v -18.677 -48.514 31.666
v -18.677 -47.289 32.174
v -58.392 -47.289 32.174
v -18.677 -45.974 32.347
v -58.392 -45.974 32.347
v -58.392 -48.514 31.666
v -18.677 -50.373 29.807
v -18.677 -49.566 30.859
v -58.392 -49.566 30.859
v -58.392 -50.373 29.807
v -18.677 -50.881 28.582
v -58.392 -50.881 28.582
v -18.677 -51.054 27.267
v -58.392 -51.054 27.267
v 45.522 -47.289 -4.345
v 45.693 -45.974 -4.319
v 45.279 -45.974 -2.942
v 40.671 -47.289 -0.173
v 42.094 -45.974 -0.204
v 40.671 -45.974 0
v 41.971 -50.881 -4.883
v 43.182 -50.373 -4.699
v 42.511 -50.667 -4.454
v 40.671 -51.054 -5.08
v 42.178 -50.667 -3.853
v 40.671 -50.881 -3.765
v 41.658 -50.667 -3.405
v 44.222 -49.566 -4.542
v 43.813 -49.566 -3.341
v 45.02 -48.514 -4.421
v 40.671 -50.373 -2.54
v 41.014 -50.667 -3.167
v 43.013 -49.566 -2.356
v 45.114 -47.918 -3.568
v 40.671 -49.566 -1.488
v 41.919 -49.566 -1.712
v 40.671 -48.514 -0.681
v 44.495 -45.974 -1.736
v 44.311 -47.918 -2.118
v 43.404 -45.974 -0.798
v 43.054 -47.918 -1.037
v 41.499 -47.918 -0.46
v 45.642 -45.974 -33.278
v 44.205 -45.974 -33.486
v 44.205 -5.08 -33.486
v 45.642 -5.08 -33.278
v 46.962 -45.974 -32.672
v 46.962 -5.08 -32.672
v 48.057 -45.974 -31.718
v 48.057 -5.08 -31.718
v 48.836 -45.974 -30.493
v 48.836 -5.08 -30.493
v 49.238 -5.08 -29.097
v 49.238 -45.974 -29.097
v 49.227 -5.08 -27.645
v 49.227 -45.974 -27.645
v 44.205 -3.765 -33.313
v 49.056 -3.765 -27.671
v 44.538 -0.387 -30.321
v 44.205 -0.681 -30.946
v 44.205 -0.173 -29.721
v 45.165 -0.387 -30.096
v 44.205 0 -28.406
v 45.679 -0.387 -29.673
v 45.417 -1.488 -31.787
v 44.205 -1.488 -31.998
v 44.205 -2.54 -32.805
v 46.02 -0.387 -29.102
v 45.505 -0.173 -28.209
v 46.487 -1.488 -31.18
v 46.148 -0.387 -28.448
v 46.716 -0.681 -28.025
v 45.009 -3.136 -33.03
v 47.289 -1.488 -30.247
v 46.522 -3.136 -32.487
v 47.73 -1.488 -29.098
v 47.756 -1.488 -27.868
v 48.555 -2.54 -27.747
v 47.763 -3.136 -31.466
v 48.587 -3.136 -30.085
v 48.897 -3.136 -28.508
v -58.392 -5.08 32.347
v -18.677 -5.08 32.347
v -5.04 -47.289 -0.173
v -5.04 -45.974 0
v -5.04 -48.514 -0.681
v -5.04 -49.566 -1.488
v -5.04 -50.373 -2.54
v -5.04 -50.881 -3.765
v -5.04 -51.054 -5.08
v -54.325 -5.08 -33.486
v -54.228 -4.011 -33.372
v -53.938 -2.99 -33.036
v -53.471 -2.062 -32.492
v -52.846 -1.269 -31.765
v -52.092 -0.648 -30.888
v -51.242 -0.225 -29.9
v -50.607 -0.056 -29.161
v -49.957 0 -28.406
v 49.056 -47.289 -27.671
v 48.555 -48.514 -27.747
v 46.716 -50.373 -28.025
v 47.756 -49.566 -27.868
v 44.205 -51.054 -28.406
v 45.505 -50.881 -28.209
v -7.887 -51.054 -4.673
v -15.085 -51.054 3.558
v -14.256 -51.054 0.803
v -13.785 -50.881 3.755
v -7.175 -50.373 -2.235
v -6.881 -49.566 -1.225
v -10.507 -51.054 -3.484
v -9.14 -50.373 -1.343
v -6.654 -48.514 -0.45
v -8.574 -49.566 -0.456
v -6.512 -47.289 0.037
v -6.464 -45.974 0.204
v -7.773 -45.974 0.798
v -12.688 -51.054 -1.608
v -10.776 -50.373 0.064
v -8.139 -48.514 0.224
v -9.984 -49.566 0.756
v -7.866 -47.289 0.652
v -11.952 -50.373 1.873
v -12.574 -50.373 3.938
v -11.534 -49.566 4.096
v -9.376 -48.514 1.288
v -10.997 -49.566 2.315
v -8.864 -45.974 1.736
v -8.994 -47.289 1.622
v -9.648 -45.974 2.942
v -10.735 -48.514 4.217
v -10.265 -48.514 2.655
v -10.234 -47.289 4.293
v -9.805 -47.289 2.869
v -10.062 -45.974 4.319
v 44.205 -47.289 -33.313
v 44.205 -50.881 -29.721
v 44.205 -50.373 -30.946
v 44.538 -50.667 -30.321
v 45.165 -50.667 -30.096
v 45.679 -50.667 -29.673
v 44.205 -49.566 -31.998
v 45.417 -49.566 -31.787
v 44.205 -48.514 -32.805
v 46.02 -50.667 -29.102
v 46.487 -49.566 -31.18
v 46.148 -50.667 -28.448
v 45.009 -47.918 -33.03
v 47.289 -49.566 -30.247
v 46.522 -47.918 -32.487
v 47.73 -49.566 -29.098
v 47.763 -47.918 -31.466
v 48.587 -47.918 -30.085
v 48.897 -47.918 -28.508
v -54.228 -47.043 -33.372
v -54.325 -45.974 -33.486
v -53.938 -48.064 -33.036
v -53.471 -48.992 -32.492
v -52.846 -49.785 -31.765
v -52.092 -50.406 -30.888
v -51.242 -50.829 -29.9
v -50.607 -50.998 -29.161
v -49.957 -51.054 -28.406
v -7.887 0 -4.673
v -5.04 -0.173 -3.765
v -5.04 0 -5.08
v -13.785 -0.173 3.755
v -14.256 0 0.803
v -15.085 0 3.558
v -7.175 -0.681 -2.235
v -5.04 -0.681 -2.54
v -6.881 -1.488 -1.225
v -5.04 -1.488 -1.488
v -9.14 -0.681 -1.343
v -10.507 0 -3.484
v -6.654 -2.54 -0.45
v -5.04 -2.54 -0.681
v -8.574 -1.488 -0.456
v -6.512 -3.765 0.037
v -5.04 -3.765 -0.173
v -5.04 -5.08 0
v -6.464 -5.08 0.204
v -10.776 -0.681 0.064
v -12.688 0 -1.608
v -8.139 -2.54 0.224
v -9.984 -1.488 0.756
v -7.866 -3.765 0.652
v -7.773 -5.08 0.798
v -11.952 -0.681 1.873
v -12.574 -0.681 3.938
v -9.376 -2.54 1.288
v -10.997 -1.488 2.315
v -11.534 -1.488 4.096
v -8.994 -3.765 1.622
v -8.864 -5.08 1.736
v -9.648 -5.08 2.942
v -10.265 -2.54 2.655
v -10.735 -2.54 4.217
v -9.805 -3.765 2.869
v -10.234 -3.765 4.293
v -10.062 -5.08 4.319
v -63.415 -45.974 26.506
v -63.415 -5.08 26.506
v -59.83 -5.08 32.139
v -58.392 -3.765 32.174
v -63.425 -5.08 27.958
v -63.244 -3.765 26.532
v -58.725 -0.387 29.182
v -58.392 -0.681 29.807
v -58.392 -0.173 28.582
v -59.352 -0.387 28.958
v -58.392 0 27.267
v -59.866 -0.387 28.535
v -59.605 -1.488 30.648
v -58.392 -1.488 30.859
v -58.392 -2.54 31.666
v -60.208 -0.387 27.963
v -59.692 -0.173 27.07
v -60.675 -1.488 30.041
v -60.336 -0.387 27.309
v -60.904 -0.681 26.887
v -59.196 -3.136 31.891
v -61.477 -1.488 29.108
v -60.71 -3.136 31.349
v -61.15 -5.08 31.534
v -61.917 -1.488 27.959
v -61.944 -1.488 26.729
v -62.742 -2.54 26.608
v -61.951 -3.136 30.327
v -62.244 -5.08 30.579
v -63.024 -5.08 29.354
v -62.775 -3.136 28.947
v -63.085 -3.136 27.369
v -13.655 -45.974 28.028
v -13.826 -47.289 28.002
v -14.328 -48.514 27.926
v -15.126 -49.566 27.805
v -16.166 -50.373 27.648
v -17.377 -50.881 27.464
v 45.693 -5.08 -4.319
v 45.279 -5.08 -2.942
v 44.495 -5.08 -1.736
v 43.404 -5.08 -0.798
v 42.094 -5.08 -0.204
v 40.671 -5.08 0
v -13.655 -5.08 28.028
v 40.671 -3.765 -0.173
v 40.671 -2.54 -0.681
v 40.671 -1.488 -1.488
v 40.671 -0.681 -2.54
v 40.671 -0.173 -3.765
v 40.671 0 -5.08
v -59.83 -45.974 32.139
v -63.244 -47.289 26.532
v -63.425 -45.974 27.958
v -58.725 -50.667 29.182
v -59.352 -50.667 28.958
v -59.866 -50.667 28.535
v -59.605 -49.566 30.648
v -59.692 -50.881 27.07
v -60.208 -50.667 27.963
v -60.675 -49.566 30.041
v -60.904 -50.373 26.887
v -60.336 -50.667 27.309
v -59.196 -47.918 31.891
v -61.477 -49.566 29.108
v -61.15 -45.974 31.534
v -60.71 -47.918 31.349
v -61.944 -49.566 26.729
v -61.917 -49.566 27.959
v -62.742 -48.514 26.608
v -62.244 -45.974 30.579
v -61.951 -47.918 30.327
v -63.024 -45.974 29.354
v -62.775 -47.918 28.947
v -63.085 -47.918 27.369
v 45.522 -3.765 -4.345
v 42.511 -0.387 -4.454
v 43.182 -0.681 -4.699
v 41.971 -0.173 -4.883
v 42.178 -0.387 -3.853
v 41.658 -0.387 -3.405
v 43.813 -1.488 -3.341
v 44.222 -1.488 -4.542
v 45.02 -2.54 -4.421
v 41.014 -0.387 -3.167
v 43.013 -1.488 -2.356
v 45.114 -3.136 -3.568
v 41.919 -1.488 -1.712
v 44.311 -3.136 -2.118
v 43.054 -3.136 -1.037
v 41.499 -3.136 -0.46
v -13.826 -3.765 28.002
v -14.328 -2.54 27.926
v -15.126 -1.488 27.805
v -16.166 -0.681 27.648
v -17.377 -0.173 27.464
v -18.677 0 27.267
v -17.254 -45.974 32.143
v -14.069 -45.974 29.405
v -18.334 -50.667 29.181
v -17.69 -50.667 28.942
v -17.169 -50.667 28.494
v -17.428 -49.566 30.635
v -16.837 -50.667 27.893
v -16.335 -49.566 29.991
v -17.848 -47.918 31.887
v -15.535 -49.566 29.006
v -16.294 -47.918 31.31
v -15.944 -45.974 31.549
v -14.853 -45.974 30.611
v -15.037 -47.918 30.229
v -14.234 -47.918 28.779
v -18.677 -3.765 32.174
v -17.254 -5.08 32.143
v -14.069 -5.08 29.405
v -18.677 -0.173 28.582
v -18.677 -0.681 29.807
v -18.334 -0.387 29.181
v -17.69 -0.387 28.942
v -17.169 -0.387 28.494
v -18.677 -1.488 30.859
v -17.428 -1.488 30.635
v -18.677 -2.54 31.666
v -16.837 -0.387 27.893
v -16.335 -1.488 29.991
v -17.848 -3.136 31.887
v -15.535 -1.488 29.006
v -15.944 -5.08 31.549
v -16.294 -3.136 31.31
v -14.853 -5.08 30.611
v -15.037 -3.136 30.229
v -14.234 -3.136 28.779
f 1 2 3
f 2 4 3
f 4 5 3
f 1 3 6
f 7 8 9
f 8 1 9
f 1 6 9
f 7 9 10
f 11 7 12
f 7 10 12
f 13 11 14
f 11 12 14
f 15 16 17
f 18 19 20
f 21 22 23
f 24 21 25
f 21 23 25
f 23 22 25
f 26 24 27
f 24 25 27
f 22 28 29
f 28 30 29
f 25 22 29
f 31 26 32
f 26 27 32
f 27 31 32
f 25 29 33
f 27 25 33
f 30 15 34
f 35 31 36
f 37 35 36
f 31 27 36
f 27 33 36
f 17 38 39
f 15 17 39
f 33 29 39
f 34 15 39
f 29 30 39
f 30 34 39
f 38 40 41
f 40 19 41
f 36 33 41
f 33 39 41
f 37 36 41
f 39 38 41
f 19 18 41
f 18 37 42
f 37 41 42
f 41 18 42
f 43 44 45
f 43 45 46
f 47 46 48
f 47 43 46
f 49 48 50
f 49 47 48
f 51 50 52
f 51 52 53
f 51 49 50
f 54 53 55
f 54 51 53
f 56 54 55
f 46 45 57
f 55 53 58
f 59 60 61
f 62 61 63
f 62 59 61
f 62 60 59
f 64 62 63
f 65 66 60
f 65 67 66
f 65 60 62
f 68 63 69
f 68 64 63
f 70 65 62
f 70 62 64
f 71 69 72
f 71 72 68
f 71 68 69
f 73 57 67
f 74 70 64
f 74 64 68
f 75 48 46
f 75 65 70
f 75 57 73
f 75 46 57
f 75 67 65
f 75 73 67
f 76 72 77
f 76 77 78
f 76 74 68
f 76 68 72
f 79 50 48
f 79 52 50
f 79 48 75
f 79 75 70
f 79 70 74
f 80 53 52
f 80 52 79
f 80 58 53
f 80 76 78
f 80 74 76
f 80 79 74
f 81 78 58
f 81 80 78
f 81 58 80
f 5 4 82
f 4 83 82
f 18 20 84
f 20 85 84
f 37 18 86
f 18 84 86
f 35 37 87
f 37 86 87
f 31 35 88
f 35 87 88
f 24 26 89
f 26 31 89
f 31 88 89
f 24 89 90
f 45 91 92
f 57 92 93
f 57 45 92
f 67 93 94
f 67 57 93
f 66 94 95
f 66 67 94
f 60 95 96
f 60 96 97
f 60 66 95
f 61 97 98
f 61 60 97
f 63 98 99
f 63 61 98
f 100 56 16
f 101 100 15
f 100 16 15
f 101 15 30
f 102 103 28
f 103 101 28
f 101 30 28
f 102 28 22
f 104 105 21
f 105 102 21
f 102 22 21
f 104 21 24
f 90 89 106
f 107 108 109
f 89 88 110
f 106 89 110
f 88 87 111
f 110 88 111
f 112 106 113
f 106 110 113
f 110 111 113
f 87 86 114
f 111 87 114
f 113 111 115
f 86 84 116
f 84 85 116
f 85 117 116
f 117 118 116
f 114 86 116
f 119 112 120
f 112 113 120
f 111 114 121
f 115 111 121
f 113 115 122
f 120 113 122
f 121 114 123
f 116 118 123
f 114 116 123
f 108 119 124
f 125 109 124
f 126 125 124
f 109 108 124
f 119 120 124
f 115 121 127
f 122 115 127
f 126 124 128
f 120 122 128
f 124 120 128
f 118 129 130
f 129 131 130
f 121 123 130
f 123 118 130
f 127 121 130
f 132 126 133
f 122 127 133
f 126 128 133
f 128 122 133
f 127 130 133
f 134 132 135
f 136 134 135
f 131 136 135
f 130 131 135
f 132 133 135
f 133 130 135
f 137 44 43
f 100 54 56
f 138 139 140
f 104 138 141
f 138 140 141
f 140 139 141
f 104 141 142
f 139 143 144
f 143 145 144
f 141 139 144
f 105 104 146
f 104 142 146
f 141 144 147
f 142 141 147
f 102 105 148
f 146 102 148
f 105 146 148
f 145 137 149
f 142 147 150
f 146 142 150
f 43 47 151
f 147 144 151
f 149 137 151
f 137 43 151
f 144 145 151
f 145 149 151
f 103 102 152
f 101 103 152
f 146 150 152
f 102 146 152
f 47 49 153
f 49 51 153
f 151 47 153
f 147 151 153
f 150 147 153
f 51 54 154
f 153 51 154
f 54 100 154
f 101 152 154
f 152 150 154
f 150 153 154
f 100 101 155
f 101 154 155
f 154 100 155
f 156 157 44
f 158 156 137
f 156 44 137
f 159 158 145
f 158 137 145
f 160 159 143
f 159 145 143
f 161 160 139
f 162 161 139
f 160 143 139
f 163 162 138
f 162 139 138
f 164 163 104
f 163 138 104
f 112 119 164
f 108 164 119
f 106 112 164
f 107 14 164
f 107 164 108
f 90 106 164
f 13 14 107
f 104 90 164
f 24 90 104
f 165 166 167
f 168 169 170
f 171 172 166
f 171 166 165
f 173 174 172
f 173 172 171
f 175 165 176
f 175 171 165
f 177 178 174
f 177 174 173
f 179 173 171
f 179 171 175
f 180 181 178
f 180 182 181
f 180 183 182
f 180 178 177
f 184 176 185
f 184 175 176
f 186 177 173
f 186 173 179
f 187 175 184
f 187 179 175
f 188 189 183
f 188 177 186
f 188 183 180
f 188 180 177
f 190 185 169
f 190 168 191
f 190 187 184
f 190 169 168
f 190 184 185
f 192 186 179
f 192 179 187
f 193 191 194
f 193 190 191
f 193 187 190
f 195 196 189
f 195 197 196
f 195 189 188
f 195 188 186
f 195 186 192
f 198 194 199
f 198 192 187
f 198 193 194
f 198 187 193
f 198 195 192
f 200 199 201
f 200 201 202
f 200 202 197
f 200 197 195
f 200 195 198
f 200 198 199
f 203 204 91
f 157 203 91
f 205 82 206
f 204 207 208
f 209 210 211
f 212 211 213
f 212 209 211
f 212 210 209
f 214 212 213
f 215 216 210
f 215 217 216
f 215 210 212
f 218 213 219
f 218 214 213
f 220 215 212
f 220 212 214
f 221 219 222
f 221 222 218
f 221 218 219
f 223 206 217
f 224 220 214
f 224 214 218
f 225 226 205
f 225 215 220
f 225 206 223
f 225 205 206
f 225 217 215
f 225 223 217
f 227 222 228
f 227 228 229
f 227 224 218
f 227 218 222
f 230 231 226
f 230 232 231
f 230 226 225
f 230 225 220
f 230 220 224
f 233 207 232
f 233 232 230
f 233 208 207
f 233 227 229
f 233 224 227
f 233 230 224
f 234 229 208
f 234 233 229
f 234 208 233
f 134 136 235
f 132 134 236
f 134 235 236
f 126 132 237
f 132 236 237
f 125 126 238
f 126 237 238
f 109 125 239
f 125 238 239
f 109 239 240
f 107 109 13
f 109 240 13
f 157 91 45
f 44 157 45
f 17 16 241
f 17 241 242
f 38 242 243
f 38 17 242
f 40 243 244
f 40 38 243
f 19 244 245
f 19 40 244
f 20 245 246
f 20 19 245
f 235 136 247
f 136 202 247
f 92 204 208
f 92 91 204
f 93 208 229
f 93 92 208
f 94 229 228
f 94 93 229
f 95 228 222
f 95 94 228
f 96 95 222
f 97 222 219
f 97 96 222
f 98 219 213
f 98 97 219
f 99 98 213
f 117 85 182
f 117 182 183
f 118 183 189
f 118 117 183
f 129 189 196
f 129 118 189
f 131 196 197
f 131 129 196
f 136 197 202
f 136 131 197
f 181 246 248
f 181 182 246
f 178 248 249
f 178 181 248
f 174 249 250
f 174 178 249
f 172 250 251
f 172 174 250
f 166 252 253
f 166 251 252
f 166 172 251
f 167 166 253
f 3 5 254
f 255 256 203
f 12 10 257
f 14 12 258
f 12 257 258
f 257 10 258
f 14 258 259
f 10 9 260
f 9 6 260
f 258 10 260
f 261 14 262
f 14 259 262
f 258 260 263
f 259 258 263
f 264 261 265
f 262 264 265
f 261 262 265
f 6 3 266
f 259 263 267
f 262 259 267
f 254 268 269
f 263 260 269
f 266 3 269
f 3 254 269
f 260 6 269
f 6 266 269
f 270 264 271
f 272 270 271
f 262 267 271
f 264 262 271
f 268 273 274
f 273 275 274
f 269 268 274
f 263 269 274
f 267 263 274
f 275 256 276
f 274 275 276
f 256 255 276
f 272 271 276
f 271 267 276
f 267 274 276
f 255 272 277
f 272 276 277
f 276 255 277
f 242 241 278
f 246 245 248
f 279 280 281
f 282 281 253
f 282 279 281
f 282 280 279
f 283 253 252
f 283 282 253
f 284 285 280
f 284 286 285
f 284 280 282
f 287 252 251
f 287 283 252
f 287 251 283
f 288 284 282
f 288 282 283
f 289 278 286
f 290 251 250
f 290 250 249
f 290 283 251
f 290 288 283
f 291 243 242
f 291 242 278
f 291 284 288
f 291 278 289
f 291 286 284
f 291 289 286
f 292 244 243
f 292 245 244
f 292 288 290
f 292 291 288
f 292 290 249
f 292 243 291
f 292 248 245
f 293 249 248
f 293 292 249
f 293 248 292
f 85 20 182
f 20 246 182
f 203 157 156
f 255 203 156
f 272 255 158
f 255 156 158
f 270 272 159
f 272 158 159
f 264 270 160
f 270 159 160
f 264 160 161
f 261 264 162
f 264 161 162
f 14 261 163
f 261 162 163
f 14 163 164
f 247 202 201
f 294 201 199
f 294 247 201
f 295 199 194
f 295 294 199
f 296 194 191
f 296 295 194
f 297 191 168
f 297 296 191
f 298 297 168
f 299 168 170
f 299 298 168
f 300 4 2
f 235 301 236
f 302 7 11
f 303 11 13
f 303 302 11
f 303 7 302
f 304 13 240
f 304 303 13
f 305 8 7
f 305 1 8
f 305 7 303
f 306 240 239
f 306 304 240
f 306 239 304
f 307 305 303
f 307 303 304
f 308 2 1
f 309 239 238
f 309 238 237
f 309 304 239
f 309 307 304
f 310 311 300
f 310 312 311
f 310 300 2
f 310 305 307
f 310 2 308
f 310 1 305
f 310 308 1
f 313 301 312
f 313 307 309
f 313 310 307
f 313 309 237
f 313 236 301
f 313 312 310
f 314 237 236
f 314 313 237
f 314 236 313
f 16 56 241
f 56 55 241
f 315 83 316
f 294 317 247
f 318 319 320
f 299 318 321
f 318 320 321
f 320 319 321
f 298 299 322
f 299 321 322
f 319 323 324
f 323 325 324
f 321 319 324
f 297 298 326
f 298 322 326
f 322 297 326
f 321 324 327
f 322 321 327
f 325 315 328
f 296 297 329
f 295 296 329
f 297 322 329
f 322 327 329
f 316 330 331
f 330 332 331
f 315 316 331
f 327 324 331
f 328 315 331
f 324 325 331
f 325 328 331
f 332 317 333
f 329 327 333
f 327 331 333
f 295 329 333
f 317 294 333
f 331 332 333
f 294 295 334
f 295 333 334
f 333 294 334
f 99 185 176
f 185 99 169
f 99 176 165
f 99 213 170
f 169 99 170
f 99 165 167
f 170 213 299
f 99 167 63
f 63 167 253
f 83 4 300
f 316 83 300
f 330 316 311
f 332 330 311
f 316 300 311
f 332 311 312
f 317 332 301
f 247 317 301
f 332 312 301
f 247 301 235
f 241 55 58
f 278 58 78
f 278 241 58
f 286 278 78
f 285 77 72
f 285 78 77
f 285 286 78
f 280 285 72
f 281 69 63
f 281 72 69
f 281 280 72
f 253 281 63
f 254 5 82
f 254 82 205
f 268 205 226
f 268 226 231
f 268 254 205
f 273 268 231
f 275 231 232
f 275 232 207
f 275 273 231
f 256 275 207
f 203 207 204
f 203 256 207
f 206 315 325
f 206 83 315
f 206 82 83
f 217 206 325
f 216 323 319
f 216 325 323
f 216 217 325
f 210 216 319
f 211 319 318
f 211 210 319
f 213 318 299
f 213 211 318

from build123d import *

# Parameters (mm, degrees)
F1_DEPTH = 51.054
F2_R     = 5.08


with BuildPart() as f1:
    # F0 (on Front) → F1 (new body)
    with BuildSketch(Plane.XZ):
        Polygon((-14.309117, 32.347076), (-64.300053, 32.347076), (-54.325373, -33.485826), (50.112445, -33.485826), (45.038836, 0), (-9.408046, 0), align=None)
    extrude(amount=F1_DEPTH)

    # F2
    f2_edges = [f1.edges().sort_by_distance(p)[0] for p in [
        (-39.304585, -51.054, 32.347076),
        (-59.312713, -51.054, -0.569375),
        (-2.106464, -51.054, -33.485826),
        (47.575641, -51.054, -16.742913),
        (17.815395, -51.054, 0),
        (-11.858581, -51.054, 16.173538),
        (-39.304585, 0, 32.347076),
        (-59.312713, 0, -0.569375),
        (-2.106464, 0, -33.485826),
        (47.575641, 0, -16.742913),
        (17.815395, 0, 0),
        (-11.858581, 0, 16.173538),
        (-9.408046, -25.527, 0),
        (-14.309117, -25.527, 32.347076),
        (45.038836, -25.527, 0),
        (50.112445, -25.527, -33.485826),
        (-64.300053, -25.527, 32.347076),
    ]]
    fillet(f2_edges, radius=F2_R)


solid = f1.part
